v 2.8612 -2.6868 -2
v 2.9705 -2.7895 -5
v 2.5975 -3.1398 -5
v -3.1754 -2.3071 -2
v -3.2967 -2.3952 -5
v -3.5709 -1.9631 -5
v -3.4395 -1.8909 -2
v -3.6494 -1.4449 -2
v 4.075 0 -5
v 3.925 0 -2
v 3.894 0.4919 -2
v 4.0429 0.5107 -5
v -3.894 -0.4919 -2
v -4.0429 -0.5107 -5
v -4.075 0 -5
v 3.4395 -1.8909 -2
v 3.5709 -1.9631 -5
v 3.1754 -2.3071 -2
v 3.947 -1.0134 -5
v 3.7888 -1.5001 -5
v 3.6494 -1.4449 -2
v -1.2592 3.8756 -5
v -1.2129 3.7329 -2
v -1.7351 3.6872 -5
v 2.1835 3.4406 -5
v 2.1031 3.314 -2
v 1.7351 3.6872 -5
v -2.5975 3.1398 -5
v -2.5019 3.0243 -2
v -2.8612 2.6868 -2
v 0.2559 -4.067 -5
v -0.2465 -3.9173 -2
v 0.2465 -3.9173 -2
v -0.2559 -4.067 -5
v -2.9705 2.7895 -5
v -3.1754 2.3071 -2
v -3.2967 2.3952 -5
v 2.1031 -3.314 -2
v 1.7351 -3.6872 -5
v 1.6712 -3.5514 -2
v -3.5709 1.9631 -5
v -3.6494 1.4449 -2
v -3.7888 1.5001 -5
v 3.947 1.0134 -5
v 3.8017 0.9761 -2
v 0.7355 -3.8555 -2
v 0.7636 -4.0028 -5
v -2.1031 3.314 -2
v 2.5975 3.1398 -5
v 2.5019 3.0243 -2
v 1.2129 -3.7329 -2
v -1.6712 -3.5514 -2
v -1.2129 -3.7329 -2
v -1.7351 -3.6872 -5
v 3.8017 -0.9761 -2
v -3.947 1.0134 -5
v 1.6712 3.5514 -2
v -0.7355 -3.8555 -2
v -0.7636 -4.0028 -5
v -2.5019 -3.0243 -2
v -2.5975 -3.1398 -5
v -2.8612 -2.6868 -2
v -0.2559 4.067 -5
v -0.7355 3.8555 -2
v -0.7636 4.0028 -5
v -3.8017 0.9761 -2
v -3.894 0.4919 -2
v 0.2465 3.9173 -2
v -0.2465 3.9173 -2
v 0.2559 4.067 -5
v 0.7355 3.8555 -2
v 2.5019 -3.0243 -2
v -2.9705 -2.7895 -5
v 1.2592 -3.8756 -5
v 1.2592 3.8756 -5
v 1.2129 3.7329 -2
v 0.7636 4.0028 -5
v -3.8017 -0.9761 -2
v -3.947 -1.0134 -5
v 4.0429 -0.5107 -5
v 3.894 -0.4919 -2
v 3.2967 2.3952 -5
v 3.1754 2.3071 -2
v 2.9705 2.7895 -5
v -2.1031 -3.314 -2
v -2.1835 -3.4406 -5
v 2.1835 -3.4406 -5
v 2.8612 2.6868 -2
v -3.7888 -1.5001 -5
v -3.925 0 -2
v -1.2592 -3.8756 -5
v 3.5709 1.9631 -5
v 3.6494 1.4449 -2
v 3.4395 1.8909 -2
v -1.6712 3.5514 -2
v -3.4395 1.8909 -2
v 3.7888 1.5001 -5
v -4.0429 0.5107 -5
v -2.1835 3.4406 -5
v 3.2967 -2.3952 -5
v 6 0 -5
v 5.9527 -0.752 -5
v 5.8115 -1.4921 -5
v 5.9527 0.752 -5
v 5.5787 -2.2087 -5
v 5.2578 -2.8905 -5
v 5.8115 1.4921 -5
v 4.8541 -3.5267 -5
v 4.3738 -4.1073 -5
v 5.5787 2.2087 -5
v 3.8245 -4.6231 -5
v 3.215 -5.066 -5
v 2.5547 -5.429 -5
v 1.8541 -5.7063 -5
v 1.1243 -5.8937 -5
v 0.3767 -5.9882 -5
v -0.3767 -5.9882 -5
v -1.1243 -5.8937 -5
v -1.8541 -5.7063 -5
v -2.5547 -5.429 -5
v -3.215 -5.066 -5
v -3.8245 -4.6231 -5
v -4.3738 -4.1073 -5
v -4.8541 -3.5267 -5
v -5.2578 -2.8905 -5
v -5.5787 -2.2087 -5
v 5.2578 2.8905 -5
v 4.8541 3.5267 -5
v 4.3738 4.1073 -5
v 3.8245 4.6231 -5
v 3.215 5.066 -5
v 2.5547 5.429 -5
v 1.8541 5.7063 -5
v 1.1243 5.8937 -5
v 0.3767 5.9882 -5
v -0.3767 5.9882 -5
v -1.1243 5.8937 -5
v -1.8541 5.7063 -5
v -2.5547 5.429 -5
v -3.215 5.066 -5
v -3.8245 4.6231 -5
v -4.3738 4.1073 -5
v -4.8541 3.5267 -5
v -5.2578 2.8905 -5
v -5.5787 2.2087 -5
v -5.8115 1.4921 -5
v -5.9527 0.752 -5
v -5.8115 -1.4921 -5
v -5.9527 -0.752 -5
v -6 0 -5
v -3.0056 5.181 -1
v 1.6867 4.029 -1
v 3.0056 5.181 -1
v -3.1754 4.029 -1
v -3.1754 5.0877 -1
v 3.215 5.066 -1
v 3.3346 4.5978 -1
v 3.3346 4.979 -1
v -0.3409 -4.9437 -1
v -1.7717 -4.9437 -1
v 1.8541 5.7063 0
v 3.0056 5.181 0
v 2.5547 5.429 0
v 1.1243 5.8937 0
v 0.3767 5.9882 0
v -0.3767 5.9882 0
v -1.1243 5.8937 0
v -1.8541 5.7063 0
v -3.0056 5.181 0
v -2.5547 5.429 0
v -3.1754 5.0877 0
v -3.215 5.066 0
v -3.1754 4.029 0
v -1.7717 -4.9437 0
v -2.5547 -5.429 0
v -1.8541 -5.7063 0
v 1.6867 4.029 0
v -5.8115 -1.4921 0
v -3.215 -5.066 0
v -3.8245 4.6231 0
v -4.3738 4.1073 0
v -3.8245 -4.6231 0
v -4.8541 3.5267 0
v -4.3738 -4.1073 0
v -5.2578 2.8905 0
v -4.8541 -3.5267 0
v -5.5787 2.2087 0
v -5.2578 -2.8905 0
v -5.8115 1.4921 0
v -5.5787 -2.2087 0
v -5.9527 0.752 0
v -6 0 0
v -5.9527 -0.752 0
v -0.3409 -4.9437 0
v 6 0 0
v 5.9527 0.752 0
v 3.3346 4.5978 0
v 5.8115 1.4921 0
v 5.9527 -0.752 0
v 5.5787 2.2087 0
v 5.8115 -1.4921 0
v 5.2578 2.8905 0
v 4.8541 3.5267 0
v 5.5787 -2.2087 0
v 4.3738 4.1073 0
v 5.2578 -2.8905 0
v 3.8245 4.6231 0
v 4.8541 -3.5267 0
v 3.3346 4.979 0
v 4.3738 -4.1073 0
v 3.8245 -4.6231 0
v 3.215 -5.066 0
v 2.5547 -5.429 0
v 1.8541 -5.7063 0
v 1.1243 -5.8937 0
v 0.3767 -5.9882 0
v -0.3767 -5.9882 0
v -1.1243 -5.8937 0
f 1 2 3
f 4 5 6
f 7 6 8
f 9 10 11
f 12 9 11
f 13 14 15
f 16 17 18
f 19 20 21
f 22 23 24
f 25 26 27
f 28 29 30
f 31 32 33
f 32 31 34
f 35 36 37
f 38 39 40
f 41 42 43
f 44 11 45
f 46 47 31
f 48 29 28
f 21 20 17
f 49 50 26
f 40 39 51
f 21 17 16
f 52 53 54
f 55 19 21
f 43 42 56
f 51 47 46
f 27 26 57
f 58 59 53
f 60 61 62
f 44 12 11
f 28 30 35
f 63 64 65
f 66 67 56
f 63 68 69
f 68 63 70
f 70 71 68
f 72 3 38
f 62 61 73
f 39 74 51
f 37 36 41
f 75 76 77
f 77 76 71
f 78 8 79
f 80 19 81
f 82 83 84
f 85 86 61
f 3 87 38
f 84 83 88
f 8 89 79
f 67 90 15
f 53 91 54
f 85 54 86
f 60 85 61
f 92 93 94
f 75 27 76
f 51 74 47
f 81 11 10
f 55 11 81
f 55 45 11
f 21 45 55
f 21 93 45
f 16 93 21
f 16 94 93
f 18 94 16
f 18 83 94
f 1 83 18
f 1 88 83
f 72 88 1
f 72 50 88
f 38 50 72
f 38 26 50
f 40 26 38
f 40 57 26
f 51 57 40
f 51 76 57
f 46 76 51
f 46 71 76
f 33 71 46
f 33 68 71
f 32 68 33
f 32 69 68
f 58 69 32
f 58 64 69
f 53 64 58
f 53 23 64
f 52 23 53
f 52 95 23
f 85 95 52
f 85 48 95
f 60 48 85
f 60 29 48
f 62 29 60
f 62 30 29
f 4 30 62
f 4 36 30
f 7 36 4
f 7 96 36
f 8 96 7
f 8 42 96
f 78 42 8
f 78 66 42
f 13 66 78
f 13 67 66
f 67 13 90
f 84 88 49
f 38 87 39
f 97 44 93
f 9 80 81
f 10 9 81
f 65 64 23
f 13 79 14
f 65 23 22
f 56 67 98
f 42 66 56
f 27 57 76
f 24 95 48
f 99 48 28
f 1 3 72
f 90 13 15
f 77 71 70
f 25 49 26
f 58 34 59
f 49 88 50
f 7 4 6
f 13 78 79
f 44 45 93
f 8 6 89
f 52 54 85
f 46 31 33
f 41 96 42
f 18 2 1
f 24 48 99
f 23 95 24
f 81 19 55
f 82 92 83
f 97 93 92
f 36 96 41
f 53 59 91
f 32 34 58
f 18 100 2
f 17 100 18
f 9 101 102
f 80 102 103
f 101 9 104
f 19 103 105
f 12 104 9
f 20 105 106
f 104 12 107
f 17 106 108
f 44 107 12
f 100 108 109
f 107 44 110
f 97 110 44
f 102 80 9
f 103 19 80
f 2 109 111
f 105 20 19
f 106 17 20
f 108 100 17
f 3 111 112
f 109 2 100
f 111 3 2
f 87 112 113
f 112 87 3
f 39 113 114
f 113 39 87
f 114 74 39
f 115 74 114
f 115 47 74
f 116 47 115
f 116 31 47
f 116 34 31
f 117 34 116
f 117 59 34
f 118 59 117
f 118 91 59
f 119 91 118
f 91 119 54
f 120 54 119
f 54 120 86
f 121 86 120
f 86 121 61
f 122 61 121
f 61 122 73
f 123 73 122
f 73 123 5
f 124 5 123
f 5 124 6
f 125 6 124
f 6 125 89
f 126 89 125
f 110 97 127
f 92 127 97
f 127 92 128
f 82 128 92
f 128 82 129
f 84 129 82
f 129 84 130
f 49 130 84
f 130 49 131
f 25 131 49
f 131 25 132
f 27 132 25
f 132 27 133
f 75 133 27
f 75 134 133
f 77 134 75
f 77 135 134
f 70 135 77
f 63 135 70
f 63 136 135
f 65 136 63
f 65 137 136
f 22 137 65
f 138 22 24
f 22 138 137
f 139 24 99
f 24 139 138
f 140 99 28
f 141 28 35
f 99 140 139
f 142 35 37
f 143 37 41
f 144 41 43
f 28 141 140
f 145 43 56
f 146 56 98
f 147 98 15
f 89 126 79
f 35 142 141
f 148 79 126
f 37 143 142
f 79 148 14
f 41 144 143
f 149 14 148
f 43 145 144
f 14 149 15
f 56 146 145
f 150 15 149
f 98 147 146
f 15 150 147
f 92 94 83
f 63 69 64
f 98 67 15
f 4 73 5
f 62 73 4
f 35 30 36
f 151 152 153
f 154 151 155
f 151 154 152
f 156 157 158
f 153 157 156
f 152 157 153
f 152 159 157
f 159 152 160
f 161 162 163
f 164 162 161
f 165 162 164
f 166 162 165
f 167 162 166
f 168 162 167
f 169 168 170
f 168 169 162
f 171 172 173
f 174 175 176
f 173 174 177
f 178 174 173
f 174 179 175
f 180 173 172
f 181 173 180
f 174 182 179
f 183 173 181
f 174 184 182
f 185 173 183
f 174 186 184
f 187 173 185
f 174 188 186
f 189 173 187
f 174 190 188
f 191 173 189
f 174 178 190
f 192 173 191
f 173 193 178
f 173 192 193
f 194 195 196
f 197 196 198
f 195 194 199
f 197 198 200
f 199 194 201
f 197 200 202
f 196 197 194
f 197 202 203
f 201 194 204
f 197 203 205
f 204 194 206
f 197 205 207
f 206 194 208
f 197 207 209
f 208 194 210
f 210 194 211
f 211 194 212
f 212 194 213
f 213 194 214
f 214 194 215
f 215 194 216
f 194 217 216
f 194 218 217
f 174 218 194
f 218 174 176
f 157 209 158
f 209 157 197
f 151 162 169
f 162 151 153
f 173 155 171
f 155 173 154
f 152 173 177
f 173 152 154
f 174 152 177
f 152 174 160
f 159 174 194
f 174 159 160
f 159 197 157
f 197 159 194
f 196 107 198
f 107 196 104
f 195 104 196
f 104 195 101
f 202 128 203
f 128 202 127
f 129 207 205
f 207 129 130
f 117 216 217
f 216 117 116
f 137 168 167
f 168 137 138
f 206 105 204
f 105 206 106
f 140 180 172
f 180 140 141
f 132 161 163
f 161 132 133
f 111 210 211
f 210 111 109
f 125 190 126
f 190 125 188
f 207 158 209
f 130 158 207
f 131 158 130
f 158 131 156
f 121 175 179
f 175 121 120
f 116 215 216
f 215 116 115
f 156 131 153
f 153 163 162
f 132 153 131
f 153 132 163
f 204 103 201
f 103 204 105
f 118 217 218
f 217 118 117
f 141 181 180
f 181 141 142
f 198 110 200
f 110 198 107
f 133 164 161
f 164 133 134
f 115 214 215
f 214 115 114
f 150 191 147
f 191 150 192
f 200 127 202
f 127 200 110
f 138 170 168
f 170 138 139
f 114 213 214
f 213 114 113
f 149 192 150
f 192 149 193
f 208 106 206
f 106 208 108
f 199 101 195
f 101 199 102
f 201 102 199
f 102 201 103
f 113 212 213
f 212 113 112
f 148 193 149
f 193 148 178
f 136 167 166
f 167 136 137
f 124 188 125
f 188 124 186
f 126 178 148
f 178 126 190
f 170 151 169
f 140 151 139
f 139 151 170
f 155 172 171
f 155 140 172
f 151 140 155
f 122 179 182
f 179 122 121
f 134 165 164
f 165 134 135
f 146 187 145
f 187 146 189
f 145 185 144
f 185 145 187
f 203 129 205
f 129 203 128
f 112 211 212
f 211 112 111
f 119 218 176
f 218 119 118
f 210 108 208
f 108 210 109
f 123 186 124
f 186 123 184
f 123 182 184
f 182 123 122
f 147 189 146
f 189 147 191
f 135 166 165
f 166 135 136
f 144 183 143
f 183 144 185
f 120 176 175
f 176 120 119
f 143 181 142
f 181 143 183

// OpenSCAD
$fn = 50;

difference() {
	union() {
		translate(v = [0, 0, -5.0]) {
			cylinder(h = 5, r = 6.0);
		}
	}
	union() {
		#translate(v = [0, 0, -5.0]) {
			cylinder(h = 3, r1 = 4.075, r2 = 3.925);
		}
		translate(v = [0, 0, -1]) {
			linear_extrude(height = 1) {
				text(font = "Impact", halign = "center", size = 10, text = "7", valign = "center");
			}
		}
	}
}
